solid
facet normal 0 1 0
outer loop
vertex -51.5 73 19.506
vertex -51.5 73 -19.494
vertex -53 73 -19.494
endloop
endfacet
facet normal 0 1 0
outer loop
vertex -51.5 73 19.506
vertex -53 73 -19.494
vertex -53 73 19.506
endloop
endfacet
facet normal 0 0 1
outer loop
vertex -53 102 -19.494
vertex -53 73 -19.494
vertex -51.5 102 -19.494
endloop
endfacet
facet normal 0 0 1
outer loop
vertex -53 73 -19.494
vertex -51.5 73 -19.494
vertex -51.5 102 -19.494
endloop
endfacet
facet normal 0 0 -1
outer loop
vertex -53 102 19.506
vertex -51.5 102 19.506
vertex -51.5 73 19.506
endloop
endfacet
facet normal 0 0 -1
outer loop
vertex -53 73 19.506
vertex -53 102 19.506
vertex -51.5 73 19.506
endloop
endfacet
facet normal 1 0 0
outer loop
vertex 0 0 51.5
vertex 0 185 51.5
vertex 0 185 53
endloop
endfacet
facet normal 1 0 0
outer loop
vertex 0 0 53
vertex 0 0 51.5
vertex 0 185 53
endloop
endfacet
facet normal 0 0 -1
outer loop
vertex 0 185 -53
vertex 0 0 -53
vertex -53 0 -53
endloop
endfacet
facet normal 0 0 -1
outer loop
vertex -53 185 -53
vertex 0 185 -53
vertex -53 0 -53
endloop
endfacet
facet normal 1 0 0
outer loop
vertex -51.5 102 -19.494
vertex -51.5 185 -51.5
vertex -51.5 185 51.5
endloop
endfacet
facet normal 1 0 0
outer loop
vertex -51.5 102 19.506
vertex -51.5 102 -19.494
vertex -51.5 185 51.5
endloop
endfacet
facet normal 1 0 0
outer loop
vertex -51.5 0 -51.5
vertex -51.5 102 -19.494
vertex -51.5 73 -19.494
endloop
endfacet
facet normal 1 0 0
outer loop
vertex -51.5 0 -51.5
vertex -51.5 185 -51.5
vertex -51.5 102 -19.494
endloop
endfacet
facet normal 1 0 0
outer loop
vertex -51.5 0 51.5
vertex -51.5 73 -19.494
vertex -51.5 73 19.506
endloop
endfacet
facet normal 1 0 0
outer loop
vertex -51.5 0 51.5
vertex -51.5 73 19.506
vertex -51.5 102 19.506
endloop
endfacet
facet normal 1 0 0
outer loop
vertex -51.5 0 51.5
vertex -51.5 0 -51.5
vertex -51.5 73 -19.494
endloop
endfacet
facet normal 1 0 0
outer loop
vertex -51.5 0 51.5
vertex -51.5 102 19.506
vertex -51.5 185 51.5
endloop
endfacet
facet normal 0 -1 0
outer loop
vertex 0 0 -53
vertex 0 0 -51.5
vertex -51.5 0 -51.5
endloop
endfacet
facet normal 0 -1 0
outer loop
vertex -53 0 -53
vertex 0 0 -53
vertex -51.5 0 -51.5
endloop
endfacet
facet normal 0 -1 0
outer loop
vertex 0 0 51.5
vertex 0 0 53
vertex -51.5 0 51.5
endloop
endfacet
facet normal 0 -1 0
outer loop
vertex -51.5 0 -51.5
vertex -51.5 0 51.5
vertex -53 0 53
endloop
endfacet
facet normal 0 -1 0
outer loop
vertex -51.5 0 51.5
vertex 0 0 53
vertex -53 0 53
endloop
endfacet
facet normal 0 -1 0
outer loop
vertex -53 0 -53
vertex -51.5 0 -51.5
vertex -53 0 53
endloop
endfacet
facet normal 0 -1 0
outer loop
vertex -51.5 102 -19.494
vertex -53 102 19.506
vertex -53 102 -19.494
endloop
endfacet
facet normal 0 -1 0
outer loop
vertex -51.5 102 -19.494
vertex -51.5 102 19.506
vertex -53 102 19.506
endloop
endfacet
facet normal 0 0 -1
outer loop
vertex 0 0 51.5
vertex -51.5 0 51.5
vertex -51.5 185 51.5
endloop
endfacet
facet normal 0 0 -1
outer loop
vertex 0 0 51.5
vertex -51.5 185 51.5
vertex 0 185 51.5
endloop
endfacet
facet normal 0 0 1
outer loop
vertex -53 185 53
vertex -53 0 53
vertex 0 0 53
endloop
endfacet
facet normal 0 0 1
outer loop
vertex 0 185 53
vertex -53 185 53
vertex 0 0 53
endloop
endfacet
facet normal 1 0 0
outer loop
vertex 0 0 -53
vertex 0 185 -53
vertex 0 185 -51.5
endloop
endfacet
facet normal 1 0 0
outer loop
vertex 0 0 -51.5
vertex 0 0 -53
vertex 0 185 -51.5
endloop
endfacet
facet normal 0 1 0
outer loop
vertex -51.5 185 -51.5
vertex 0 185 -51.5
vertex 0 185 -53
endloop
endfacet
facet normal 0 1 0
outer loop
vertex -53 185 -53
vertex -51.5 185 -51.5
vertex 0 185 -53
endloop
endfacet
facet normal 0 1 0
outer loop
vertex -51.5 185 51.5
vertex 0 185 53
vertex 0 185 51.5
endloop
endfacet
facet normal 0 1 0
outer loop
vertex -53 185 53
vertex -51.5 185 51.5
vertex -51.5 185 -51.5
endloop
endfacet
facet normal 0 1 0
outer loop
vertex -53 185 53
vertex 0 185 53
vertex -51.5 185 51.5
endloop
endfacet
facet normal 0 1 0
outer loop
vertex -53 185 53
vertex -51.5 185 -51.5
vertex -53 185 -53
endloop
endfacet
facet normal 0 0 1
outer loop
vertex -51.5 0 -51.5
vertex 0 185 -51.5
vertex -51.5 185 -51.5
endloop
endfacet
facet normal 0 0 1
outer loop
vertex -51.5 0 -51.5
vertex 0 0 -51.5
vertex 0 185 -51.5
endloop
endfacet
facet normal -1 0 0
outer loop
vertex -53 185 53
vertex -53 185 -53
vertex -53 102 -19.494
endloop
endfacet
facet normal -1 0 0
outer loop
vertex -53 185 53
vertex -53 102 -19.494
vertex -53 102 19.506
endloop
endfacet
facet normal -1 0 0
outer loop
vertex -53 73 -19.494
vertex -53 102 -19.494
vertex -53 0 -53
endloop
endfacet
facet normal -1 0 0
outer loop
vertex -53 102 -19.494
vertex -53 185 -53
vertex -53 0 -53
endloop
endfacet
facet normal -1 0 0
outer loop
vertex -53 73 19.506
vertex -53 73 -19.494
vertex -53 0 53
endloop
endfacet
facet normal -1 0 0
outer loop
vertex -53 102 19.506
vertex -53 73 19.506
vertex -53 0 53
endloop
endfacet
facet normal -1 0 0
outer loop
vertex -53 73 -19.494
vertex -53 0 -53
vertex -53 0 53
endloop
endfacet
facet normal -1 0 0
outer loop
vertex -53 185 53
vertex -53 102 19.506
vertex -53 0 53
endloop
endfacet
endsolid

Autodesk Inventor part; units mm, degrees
ref_plane "YZ Plane" through (0, 0, 0) normal (1, 0, 0) x (0, 1, 0)
ref_plane "XZ Plane" through (0, 0, 0) normal (0, 1, 0) x (-1, 0, 0)
ref_plane "XY Plane" through (0, 0, 0) normal (0, 0, 1) x (1, 0, 0)
sketch "Boceto1" plane through (0, 0, 0) normal (0, 1, 0) x (-1, 0, 0)
  line L0 (-53, -53) -> (53, -53)
  line L1 (53, -53) -> (53, 53)
  line L2 (53, 53) -> (-53, 53)
  line L3 (-53, 53) -> (-53, -53)
  line L4 (-53, -53) -> (53, 53) construction
  line L5 (53, -53) -> (-53, 53) construction
  point P0 (0, 0)
  dimension "d0" = 106
  dimension "d1" = 106
extrude "Extrusión1" add sketch "Boceto1" along normal blind 185
shell "Vaciado1" thickness 1.5 removed faces 2 at (17.6667, 0, -17.6667) at (17.6667, 185, -17.6667)
split "Dividir1" plane through (0, 0, 0) removes the side toward (1, 0, 0)
sketch "Boceto2" plane through (-51.5, 0, -51.5) normal (1, 0, 0) x (0, 0, -1)
  line L0 (-71.9943, 102) -> (-31.0057, 102) projected
  line L1 (-31.0057, 102) -> (-31.0057, 73)
  line L2 (-31.0057, 102) -> (-2.0057, 102) construction
  line L3 (-31.0057, 73) -> (-71.9943, 73)
  line L4 (-71.9943, 73) -> (-71.9943, 102)
  line L5 (-31.0057, 102) -> (-32.0057, 102)
  line L6 (-32.0057, 102) -> (-71.0057, 102)
  line L7 (-71.0057, 102) -> (-71.0057, 73)
  line L8 (-71.0057, 73) -> (-32.0057, 73)
  line L9 (-32.0057, 73) -> (-32.0057, 102)
  point P0 (-51.5, 0)
  dimension "d5" = 29
  dimension "d6" = 90
  dimension "d8" = 1
  dimension "d9" = 39
  dimension "d10" = 29
extrude "Extrusión2" cut sketch "Boceto2" against normal blind 10 contours L0 L9 L3 L7
properties part number "Caja"
